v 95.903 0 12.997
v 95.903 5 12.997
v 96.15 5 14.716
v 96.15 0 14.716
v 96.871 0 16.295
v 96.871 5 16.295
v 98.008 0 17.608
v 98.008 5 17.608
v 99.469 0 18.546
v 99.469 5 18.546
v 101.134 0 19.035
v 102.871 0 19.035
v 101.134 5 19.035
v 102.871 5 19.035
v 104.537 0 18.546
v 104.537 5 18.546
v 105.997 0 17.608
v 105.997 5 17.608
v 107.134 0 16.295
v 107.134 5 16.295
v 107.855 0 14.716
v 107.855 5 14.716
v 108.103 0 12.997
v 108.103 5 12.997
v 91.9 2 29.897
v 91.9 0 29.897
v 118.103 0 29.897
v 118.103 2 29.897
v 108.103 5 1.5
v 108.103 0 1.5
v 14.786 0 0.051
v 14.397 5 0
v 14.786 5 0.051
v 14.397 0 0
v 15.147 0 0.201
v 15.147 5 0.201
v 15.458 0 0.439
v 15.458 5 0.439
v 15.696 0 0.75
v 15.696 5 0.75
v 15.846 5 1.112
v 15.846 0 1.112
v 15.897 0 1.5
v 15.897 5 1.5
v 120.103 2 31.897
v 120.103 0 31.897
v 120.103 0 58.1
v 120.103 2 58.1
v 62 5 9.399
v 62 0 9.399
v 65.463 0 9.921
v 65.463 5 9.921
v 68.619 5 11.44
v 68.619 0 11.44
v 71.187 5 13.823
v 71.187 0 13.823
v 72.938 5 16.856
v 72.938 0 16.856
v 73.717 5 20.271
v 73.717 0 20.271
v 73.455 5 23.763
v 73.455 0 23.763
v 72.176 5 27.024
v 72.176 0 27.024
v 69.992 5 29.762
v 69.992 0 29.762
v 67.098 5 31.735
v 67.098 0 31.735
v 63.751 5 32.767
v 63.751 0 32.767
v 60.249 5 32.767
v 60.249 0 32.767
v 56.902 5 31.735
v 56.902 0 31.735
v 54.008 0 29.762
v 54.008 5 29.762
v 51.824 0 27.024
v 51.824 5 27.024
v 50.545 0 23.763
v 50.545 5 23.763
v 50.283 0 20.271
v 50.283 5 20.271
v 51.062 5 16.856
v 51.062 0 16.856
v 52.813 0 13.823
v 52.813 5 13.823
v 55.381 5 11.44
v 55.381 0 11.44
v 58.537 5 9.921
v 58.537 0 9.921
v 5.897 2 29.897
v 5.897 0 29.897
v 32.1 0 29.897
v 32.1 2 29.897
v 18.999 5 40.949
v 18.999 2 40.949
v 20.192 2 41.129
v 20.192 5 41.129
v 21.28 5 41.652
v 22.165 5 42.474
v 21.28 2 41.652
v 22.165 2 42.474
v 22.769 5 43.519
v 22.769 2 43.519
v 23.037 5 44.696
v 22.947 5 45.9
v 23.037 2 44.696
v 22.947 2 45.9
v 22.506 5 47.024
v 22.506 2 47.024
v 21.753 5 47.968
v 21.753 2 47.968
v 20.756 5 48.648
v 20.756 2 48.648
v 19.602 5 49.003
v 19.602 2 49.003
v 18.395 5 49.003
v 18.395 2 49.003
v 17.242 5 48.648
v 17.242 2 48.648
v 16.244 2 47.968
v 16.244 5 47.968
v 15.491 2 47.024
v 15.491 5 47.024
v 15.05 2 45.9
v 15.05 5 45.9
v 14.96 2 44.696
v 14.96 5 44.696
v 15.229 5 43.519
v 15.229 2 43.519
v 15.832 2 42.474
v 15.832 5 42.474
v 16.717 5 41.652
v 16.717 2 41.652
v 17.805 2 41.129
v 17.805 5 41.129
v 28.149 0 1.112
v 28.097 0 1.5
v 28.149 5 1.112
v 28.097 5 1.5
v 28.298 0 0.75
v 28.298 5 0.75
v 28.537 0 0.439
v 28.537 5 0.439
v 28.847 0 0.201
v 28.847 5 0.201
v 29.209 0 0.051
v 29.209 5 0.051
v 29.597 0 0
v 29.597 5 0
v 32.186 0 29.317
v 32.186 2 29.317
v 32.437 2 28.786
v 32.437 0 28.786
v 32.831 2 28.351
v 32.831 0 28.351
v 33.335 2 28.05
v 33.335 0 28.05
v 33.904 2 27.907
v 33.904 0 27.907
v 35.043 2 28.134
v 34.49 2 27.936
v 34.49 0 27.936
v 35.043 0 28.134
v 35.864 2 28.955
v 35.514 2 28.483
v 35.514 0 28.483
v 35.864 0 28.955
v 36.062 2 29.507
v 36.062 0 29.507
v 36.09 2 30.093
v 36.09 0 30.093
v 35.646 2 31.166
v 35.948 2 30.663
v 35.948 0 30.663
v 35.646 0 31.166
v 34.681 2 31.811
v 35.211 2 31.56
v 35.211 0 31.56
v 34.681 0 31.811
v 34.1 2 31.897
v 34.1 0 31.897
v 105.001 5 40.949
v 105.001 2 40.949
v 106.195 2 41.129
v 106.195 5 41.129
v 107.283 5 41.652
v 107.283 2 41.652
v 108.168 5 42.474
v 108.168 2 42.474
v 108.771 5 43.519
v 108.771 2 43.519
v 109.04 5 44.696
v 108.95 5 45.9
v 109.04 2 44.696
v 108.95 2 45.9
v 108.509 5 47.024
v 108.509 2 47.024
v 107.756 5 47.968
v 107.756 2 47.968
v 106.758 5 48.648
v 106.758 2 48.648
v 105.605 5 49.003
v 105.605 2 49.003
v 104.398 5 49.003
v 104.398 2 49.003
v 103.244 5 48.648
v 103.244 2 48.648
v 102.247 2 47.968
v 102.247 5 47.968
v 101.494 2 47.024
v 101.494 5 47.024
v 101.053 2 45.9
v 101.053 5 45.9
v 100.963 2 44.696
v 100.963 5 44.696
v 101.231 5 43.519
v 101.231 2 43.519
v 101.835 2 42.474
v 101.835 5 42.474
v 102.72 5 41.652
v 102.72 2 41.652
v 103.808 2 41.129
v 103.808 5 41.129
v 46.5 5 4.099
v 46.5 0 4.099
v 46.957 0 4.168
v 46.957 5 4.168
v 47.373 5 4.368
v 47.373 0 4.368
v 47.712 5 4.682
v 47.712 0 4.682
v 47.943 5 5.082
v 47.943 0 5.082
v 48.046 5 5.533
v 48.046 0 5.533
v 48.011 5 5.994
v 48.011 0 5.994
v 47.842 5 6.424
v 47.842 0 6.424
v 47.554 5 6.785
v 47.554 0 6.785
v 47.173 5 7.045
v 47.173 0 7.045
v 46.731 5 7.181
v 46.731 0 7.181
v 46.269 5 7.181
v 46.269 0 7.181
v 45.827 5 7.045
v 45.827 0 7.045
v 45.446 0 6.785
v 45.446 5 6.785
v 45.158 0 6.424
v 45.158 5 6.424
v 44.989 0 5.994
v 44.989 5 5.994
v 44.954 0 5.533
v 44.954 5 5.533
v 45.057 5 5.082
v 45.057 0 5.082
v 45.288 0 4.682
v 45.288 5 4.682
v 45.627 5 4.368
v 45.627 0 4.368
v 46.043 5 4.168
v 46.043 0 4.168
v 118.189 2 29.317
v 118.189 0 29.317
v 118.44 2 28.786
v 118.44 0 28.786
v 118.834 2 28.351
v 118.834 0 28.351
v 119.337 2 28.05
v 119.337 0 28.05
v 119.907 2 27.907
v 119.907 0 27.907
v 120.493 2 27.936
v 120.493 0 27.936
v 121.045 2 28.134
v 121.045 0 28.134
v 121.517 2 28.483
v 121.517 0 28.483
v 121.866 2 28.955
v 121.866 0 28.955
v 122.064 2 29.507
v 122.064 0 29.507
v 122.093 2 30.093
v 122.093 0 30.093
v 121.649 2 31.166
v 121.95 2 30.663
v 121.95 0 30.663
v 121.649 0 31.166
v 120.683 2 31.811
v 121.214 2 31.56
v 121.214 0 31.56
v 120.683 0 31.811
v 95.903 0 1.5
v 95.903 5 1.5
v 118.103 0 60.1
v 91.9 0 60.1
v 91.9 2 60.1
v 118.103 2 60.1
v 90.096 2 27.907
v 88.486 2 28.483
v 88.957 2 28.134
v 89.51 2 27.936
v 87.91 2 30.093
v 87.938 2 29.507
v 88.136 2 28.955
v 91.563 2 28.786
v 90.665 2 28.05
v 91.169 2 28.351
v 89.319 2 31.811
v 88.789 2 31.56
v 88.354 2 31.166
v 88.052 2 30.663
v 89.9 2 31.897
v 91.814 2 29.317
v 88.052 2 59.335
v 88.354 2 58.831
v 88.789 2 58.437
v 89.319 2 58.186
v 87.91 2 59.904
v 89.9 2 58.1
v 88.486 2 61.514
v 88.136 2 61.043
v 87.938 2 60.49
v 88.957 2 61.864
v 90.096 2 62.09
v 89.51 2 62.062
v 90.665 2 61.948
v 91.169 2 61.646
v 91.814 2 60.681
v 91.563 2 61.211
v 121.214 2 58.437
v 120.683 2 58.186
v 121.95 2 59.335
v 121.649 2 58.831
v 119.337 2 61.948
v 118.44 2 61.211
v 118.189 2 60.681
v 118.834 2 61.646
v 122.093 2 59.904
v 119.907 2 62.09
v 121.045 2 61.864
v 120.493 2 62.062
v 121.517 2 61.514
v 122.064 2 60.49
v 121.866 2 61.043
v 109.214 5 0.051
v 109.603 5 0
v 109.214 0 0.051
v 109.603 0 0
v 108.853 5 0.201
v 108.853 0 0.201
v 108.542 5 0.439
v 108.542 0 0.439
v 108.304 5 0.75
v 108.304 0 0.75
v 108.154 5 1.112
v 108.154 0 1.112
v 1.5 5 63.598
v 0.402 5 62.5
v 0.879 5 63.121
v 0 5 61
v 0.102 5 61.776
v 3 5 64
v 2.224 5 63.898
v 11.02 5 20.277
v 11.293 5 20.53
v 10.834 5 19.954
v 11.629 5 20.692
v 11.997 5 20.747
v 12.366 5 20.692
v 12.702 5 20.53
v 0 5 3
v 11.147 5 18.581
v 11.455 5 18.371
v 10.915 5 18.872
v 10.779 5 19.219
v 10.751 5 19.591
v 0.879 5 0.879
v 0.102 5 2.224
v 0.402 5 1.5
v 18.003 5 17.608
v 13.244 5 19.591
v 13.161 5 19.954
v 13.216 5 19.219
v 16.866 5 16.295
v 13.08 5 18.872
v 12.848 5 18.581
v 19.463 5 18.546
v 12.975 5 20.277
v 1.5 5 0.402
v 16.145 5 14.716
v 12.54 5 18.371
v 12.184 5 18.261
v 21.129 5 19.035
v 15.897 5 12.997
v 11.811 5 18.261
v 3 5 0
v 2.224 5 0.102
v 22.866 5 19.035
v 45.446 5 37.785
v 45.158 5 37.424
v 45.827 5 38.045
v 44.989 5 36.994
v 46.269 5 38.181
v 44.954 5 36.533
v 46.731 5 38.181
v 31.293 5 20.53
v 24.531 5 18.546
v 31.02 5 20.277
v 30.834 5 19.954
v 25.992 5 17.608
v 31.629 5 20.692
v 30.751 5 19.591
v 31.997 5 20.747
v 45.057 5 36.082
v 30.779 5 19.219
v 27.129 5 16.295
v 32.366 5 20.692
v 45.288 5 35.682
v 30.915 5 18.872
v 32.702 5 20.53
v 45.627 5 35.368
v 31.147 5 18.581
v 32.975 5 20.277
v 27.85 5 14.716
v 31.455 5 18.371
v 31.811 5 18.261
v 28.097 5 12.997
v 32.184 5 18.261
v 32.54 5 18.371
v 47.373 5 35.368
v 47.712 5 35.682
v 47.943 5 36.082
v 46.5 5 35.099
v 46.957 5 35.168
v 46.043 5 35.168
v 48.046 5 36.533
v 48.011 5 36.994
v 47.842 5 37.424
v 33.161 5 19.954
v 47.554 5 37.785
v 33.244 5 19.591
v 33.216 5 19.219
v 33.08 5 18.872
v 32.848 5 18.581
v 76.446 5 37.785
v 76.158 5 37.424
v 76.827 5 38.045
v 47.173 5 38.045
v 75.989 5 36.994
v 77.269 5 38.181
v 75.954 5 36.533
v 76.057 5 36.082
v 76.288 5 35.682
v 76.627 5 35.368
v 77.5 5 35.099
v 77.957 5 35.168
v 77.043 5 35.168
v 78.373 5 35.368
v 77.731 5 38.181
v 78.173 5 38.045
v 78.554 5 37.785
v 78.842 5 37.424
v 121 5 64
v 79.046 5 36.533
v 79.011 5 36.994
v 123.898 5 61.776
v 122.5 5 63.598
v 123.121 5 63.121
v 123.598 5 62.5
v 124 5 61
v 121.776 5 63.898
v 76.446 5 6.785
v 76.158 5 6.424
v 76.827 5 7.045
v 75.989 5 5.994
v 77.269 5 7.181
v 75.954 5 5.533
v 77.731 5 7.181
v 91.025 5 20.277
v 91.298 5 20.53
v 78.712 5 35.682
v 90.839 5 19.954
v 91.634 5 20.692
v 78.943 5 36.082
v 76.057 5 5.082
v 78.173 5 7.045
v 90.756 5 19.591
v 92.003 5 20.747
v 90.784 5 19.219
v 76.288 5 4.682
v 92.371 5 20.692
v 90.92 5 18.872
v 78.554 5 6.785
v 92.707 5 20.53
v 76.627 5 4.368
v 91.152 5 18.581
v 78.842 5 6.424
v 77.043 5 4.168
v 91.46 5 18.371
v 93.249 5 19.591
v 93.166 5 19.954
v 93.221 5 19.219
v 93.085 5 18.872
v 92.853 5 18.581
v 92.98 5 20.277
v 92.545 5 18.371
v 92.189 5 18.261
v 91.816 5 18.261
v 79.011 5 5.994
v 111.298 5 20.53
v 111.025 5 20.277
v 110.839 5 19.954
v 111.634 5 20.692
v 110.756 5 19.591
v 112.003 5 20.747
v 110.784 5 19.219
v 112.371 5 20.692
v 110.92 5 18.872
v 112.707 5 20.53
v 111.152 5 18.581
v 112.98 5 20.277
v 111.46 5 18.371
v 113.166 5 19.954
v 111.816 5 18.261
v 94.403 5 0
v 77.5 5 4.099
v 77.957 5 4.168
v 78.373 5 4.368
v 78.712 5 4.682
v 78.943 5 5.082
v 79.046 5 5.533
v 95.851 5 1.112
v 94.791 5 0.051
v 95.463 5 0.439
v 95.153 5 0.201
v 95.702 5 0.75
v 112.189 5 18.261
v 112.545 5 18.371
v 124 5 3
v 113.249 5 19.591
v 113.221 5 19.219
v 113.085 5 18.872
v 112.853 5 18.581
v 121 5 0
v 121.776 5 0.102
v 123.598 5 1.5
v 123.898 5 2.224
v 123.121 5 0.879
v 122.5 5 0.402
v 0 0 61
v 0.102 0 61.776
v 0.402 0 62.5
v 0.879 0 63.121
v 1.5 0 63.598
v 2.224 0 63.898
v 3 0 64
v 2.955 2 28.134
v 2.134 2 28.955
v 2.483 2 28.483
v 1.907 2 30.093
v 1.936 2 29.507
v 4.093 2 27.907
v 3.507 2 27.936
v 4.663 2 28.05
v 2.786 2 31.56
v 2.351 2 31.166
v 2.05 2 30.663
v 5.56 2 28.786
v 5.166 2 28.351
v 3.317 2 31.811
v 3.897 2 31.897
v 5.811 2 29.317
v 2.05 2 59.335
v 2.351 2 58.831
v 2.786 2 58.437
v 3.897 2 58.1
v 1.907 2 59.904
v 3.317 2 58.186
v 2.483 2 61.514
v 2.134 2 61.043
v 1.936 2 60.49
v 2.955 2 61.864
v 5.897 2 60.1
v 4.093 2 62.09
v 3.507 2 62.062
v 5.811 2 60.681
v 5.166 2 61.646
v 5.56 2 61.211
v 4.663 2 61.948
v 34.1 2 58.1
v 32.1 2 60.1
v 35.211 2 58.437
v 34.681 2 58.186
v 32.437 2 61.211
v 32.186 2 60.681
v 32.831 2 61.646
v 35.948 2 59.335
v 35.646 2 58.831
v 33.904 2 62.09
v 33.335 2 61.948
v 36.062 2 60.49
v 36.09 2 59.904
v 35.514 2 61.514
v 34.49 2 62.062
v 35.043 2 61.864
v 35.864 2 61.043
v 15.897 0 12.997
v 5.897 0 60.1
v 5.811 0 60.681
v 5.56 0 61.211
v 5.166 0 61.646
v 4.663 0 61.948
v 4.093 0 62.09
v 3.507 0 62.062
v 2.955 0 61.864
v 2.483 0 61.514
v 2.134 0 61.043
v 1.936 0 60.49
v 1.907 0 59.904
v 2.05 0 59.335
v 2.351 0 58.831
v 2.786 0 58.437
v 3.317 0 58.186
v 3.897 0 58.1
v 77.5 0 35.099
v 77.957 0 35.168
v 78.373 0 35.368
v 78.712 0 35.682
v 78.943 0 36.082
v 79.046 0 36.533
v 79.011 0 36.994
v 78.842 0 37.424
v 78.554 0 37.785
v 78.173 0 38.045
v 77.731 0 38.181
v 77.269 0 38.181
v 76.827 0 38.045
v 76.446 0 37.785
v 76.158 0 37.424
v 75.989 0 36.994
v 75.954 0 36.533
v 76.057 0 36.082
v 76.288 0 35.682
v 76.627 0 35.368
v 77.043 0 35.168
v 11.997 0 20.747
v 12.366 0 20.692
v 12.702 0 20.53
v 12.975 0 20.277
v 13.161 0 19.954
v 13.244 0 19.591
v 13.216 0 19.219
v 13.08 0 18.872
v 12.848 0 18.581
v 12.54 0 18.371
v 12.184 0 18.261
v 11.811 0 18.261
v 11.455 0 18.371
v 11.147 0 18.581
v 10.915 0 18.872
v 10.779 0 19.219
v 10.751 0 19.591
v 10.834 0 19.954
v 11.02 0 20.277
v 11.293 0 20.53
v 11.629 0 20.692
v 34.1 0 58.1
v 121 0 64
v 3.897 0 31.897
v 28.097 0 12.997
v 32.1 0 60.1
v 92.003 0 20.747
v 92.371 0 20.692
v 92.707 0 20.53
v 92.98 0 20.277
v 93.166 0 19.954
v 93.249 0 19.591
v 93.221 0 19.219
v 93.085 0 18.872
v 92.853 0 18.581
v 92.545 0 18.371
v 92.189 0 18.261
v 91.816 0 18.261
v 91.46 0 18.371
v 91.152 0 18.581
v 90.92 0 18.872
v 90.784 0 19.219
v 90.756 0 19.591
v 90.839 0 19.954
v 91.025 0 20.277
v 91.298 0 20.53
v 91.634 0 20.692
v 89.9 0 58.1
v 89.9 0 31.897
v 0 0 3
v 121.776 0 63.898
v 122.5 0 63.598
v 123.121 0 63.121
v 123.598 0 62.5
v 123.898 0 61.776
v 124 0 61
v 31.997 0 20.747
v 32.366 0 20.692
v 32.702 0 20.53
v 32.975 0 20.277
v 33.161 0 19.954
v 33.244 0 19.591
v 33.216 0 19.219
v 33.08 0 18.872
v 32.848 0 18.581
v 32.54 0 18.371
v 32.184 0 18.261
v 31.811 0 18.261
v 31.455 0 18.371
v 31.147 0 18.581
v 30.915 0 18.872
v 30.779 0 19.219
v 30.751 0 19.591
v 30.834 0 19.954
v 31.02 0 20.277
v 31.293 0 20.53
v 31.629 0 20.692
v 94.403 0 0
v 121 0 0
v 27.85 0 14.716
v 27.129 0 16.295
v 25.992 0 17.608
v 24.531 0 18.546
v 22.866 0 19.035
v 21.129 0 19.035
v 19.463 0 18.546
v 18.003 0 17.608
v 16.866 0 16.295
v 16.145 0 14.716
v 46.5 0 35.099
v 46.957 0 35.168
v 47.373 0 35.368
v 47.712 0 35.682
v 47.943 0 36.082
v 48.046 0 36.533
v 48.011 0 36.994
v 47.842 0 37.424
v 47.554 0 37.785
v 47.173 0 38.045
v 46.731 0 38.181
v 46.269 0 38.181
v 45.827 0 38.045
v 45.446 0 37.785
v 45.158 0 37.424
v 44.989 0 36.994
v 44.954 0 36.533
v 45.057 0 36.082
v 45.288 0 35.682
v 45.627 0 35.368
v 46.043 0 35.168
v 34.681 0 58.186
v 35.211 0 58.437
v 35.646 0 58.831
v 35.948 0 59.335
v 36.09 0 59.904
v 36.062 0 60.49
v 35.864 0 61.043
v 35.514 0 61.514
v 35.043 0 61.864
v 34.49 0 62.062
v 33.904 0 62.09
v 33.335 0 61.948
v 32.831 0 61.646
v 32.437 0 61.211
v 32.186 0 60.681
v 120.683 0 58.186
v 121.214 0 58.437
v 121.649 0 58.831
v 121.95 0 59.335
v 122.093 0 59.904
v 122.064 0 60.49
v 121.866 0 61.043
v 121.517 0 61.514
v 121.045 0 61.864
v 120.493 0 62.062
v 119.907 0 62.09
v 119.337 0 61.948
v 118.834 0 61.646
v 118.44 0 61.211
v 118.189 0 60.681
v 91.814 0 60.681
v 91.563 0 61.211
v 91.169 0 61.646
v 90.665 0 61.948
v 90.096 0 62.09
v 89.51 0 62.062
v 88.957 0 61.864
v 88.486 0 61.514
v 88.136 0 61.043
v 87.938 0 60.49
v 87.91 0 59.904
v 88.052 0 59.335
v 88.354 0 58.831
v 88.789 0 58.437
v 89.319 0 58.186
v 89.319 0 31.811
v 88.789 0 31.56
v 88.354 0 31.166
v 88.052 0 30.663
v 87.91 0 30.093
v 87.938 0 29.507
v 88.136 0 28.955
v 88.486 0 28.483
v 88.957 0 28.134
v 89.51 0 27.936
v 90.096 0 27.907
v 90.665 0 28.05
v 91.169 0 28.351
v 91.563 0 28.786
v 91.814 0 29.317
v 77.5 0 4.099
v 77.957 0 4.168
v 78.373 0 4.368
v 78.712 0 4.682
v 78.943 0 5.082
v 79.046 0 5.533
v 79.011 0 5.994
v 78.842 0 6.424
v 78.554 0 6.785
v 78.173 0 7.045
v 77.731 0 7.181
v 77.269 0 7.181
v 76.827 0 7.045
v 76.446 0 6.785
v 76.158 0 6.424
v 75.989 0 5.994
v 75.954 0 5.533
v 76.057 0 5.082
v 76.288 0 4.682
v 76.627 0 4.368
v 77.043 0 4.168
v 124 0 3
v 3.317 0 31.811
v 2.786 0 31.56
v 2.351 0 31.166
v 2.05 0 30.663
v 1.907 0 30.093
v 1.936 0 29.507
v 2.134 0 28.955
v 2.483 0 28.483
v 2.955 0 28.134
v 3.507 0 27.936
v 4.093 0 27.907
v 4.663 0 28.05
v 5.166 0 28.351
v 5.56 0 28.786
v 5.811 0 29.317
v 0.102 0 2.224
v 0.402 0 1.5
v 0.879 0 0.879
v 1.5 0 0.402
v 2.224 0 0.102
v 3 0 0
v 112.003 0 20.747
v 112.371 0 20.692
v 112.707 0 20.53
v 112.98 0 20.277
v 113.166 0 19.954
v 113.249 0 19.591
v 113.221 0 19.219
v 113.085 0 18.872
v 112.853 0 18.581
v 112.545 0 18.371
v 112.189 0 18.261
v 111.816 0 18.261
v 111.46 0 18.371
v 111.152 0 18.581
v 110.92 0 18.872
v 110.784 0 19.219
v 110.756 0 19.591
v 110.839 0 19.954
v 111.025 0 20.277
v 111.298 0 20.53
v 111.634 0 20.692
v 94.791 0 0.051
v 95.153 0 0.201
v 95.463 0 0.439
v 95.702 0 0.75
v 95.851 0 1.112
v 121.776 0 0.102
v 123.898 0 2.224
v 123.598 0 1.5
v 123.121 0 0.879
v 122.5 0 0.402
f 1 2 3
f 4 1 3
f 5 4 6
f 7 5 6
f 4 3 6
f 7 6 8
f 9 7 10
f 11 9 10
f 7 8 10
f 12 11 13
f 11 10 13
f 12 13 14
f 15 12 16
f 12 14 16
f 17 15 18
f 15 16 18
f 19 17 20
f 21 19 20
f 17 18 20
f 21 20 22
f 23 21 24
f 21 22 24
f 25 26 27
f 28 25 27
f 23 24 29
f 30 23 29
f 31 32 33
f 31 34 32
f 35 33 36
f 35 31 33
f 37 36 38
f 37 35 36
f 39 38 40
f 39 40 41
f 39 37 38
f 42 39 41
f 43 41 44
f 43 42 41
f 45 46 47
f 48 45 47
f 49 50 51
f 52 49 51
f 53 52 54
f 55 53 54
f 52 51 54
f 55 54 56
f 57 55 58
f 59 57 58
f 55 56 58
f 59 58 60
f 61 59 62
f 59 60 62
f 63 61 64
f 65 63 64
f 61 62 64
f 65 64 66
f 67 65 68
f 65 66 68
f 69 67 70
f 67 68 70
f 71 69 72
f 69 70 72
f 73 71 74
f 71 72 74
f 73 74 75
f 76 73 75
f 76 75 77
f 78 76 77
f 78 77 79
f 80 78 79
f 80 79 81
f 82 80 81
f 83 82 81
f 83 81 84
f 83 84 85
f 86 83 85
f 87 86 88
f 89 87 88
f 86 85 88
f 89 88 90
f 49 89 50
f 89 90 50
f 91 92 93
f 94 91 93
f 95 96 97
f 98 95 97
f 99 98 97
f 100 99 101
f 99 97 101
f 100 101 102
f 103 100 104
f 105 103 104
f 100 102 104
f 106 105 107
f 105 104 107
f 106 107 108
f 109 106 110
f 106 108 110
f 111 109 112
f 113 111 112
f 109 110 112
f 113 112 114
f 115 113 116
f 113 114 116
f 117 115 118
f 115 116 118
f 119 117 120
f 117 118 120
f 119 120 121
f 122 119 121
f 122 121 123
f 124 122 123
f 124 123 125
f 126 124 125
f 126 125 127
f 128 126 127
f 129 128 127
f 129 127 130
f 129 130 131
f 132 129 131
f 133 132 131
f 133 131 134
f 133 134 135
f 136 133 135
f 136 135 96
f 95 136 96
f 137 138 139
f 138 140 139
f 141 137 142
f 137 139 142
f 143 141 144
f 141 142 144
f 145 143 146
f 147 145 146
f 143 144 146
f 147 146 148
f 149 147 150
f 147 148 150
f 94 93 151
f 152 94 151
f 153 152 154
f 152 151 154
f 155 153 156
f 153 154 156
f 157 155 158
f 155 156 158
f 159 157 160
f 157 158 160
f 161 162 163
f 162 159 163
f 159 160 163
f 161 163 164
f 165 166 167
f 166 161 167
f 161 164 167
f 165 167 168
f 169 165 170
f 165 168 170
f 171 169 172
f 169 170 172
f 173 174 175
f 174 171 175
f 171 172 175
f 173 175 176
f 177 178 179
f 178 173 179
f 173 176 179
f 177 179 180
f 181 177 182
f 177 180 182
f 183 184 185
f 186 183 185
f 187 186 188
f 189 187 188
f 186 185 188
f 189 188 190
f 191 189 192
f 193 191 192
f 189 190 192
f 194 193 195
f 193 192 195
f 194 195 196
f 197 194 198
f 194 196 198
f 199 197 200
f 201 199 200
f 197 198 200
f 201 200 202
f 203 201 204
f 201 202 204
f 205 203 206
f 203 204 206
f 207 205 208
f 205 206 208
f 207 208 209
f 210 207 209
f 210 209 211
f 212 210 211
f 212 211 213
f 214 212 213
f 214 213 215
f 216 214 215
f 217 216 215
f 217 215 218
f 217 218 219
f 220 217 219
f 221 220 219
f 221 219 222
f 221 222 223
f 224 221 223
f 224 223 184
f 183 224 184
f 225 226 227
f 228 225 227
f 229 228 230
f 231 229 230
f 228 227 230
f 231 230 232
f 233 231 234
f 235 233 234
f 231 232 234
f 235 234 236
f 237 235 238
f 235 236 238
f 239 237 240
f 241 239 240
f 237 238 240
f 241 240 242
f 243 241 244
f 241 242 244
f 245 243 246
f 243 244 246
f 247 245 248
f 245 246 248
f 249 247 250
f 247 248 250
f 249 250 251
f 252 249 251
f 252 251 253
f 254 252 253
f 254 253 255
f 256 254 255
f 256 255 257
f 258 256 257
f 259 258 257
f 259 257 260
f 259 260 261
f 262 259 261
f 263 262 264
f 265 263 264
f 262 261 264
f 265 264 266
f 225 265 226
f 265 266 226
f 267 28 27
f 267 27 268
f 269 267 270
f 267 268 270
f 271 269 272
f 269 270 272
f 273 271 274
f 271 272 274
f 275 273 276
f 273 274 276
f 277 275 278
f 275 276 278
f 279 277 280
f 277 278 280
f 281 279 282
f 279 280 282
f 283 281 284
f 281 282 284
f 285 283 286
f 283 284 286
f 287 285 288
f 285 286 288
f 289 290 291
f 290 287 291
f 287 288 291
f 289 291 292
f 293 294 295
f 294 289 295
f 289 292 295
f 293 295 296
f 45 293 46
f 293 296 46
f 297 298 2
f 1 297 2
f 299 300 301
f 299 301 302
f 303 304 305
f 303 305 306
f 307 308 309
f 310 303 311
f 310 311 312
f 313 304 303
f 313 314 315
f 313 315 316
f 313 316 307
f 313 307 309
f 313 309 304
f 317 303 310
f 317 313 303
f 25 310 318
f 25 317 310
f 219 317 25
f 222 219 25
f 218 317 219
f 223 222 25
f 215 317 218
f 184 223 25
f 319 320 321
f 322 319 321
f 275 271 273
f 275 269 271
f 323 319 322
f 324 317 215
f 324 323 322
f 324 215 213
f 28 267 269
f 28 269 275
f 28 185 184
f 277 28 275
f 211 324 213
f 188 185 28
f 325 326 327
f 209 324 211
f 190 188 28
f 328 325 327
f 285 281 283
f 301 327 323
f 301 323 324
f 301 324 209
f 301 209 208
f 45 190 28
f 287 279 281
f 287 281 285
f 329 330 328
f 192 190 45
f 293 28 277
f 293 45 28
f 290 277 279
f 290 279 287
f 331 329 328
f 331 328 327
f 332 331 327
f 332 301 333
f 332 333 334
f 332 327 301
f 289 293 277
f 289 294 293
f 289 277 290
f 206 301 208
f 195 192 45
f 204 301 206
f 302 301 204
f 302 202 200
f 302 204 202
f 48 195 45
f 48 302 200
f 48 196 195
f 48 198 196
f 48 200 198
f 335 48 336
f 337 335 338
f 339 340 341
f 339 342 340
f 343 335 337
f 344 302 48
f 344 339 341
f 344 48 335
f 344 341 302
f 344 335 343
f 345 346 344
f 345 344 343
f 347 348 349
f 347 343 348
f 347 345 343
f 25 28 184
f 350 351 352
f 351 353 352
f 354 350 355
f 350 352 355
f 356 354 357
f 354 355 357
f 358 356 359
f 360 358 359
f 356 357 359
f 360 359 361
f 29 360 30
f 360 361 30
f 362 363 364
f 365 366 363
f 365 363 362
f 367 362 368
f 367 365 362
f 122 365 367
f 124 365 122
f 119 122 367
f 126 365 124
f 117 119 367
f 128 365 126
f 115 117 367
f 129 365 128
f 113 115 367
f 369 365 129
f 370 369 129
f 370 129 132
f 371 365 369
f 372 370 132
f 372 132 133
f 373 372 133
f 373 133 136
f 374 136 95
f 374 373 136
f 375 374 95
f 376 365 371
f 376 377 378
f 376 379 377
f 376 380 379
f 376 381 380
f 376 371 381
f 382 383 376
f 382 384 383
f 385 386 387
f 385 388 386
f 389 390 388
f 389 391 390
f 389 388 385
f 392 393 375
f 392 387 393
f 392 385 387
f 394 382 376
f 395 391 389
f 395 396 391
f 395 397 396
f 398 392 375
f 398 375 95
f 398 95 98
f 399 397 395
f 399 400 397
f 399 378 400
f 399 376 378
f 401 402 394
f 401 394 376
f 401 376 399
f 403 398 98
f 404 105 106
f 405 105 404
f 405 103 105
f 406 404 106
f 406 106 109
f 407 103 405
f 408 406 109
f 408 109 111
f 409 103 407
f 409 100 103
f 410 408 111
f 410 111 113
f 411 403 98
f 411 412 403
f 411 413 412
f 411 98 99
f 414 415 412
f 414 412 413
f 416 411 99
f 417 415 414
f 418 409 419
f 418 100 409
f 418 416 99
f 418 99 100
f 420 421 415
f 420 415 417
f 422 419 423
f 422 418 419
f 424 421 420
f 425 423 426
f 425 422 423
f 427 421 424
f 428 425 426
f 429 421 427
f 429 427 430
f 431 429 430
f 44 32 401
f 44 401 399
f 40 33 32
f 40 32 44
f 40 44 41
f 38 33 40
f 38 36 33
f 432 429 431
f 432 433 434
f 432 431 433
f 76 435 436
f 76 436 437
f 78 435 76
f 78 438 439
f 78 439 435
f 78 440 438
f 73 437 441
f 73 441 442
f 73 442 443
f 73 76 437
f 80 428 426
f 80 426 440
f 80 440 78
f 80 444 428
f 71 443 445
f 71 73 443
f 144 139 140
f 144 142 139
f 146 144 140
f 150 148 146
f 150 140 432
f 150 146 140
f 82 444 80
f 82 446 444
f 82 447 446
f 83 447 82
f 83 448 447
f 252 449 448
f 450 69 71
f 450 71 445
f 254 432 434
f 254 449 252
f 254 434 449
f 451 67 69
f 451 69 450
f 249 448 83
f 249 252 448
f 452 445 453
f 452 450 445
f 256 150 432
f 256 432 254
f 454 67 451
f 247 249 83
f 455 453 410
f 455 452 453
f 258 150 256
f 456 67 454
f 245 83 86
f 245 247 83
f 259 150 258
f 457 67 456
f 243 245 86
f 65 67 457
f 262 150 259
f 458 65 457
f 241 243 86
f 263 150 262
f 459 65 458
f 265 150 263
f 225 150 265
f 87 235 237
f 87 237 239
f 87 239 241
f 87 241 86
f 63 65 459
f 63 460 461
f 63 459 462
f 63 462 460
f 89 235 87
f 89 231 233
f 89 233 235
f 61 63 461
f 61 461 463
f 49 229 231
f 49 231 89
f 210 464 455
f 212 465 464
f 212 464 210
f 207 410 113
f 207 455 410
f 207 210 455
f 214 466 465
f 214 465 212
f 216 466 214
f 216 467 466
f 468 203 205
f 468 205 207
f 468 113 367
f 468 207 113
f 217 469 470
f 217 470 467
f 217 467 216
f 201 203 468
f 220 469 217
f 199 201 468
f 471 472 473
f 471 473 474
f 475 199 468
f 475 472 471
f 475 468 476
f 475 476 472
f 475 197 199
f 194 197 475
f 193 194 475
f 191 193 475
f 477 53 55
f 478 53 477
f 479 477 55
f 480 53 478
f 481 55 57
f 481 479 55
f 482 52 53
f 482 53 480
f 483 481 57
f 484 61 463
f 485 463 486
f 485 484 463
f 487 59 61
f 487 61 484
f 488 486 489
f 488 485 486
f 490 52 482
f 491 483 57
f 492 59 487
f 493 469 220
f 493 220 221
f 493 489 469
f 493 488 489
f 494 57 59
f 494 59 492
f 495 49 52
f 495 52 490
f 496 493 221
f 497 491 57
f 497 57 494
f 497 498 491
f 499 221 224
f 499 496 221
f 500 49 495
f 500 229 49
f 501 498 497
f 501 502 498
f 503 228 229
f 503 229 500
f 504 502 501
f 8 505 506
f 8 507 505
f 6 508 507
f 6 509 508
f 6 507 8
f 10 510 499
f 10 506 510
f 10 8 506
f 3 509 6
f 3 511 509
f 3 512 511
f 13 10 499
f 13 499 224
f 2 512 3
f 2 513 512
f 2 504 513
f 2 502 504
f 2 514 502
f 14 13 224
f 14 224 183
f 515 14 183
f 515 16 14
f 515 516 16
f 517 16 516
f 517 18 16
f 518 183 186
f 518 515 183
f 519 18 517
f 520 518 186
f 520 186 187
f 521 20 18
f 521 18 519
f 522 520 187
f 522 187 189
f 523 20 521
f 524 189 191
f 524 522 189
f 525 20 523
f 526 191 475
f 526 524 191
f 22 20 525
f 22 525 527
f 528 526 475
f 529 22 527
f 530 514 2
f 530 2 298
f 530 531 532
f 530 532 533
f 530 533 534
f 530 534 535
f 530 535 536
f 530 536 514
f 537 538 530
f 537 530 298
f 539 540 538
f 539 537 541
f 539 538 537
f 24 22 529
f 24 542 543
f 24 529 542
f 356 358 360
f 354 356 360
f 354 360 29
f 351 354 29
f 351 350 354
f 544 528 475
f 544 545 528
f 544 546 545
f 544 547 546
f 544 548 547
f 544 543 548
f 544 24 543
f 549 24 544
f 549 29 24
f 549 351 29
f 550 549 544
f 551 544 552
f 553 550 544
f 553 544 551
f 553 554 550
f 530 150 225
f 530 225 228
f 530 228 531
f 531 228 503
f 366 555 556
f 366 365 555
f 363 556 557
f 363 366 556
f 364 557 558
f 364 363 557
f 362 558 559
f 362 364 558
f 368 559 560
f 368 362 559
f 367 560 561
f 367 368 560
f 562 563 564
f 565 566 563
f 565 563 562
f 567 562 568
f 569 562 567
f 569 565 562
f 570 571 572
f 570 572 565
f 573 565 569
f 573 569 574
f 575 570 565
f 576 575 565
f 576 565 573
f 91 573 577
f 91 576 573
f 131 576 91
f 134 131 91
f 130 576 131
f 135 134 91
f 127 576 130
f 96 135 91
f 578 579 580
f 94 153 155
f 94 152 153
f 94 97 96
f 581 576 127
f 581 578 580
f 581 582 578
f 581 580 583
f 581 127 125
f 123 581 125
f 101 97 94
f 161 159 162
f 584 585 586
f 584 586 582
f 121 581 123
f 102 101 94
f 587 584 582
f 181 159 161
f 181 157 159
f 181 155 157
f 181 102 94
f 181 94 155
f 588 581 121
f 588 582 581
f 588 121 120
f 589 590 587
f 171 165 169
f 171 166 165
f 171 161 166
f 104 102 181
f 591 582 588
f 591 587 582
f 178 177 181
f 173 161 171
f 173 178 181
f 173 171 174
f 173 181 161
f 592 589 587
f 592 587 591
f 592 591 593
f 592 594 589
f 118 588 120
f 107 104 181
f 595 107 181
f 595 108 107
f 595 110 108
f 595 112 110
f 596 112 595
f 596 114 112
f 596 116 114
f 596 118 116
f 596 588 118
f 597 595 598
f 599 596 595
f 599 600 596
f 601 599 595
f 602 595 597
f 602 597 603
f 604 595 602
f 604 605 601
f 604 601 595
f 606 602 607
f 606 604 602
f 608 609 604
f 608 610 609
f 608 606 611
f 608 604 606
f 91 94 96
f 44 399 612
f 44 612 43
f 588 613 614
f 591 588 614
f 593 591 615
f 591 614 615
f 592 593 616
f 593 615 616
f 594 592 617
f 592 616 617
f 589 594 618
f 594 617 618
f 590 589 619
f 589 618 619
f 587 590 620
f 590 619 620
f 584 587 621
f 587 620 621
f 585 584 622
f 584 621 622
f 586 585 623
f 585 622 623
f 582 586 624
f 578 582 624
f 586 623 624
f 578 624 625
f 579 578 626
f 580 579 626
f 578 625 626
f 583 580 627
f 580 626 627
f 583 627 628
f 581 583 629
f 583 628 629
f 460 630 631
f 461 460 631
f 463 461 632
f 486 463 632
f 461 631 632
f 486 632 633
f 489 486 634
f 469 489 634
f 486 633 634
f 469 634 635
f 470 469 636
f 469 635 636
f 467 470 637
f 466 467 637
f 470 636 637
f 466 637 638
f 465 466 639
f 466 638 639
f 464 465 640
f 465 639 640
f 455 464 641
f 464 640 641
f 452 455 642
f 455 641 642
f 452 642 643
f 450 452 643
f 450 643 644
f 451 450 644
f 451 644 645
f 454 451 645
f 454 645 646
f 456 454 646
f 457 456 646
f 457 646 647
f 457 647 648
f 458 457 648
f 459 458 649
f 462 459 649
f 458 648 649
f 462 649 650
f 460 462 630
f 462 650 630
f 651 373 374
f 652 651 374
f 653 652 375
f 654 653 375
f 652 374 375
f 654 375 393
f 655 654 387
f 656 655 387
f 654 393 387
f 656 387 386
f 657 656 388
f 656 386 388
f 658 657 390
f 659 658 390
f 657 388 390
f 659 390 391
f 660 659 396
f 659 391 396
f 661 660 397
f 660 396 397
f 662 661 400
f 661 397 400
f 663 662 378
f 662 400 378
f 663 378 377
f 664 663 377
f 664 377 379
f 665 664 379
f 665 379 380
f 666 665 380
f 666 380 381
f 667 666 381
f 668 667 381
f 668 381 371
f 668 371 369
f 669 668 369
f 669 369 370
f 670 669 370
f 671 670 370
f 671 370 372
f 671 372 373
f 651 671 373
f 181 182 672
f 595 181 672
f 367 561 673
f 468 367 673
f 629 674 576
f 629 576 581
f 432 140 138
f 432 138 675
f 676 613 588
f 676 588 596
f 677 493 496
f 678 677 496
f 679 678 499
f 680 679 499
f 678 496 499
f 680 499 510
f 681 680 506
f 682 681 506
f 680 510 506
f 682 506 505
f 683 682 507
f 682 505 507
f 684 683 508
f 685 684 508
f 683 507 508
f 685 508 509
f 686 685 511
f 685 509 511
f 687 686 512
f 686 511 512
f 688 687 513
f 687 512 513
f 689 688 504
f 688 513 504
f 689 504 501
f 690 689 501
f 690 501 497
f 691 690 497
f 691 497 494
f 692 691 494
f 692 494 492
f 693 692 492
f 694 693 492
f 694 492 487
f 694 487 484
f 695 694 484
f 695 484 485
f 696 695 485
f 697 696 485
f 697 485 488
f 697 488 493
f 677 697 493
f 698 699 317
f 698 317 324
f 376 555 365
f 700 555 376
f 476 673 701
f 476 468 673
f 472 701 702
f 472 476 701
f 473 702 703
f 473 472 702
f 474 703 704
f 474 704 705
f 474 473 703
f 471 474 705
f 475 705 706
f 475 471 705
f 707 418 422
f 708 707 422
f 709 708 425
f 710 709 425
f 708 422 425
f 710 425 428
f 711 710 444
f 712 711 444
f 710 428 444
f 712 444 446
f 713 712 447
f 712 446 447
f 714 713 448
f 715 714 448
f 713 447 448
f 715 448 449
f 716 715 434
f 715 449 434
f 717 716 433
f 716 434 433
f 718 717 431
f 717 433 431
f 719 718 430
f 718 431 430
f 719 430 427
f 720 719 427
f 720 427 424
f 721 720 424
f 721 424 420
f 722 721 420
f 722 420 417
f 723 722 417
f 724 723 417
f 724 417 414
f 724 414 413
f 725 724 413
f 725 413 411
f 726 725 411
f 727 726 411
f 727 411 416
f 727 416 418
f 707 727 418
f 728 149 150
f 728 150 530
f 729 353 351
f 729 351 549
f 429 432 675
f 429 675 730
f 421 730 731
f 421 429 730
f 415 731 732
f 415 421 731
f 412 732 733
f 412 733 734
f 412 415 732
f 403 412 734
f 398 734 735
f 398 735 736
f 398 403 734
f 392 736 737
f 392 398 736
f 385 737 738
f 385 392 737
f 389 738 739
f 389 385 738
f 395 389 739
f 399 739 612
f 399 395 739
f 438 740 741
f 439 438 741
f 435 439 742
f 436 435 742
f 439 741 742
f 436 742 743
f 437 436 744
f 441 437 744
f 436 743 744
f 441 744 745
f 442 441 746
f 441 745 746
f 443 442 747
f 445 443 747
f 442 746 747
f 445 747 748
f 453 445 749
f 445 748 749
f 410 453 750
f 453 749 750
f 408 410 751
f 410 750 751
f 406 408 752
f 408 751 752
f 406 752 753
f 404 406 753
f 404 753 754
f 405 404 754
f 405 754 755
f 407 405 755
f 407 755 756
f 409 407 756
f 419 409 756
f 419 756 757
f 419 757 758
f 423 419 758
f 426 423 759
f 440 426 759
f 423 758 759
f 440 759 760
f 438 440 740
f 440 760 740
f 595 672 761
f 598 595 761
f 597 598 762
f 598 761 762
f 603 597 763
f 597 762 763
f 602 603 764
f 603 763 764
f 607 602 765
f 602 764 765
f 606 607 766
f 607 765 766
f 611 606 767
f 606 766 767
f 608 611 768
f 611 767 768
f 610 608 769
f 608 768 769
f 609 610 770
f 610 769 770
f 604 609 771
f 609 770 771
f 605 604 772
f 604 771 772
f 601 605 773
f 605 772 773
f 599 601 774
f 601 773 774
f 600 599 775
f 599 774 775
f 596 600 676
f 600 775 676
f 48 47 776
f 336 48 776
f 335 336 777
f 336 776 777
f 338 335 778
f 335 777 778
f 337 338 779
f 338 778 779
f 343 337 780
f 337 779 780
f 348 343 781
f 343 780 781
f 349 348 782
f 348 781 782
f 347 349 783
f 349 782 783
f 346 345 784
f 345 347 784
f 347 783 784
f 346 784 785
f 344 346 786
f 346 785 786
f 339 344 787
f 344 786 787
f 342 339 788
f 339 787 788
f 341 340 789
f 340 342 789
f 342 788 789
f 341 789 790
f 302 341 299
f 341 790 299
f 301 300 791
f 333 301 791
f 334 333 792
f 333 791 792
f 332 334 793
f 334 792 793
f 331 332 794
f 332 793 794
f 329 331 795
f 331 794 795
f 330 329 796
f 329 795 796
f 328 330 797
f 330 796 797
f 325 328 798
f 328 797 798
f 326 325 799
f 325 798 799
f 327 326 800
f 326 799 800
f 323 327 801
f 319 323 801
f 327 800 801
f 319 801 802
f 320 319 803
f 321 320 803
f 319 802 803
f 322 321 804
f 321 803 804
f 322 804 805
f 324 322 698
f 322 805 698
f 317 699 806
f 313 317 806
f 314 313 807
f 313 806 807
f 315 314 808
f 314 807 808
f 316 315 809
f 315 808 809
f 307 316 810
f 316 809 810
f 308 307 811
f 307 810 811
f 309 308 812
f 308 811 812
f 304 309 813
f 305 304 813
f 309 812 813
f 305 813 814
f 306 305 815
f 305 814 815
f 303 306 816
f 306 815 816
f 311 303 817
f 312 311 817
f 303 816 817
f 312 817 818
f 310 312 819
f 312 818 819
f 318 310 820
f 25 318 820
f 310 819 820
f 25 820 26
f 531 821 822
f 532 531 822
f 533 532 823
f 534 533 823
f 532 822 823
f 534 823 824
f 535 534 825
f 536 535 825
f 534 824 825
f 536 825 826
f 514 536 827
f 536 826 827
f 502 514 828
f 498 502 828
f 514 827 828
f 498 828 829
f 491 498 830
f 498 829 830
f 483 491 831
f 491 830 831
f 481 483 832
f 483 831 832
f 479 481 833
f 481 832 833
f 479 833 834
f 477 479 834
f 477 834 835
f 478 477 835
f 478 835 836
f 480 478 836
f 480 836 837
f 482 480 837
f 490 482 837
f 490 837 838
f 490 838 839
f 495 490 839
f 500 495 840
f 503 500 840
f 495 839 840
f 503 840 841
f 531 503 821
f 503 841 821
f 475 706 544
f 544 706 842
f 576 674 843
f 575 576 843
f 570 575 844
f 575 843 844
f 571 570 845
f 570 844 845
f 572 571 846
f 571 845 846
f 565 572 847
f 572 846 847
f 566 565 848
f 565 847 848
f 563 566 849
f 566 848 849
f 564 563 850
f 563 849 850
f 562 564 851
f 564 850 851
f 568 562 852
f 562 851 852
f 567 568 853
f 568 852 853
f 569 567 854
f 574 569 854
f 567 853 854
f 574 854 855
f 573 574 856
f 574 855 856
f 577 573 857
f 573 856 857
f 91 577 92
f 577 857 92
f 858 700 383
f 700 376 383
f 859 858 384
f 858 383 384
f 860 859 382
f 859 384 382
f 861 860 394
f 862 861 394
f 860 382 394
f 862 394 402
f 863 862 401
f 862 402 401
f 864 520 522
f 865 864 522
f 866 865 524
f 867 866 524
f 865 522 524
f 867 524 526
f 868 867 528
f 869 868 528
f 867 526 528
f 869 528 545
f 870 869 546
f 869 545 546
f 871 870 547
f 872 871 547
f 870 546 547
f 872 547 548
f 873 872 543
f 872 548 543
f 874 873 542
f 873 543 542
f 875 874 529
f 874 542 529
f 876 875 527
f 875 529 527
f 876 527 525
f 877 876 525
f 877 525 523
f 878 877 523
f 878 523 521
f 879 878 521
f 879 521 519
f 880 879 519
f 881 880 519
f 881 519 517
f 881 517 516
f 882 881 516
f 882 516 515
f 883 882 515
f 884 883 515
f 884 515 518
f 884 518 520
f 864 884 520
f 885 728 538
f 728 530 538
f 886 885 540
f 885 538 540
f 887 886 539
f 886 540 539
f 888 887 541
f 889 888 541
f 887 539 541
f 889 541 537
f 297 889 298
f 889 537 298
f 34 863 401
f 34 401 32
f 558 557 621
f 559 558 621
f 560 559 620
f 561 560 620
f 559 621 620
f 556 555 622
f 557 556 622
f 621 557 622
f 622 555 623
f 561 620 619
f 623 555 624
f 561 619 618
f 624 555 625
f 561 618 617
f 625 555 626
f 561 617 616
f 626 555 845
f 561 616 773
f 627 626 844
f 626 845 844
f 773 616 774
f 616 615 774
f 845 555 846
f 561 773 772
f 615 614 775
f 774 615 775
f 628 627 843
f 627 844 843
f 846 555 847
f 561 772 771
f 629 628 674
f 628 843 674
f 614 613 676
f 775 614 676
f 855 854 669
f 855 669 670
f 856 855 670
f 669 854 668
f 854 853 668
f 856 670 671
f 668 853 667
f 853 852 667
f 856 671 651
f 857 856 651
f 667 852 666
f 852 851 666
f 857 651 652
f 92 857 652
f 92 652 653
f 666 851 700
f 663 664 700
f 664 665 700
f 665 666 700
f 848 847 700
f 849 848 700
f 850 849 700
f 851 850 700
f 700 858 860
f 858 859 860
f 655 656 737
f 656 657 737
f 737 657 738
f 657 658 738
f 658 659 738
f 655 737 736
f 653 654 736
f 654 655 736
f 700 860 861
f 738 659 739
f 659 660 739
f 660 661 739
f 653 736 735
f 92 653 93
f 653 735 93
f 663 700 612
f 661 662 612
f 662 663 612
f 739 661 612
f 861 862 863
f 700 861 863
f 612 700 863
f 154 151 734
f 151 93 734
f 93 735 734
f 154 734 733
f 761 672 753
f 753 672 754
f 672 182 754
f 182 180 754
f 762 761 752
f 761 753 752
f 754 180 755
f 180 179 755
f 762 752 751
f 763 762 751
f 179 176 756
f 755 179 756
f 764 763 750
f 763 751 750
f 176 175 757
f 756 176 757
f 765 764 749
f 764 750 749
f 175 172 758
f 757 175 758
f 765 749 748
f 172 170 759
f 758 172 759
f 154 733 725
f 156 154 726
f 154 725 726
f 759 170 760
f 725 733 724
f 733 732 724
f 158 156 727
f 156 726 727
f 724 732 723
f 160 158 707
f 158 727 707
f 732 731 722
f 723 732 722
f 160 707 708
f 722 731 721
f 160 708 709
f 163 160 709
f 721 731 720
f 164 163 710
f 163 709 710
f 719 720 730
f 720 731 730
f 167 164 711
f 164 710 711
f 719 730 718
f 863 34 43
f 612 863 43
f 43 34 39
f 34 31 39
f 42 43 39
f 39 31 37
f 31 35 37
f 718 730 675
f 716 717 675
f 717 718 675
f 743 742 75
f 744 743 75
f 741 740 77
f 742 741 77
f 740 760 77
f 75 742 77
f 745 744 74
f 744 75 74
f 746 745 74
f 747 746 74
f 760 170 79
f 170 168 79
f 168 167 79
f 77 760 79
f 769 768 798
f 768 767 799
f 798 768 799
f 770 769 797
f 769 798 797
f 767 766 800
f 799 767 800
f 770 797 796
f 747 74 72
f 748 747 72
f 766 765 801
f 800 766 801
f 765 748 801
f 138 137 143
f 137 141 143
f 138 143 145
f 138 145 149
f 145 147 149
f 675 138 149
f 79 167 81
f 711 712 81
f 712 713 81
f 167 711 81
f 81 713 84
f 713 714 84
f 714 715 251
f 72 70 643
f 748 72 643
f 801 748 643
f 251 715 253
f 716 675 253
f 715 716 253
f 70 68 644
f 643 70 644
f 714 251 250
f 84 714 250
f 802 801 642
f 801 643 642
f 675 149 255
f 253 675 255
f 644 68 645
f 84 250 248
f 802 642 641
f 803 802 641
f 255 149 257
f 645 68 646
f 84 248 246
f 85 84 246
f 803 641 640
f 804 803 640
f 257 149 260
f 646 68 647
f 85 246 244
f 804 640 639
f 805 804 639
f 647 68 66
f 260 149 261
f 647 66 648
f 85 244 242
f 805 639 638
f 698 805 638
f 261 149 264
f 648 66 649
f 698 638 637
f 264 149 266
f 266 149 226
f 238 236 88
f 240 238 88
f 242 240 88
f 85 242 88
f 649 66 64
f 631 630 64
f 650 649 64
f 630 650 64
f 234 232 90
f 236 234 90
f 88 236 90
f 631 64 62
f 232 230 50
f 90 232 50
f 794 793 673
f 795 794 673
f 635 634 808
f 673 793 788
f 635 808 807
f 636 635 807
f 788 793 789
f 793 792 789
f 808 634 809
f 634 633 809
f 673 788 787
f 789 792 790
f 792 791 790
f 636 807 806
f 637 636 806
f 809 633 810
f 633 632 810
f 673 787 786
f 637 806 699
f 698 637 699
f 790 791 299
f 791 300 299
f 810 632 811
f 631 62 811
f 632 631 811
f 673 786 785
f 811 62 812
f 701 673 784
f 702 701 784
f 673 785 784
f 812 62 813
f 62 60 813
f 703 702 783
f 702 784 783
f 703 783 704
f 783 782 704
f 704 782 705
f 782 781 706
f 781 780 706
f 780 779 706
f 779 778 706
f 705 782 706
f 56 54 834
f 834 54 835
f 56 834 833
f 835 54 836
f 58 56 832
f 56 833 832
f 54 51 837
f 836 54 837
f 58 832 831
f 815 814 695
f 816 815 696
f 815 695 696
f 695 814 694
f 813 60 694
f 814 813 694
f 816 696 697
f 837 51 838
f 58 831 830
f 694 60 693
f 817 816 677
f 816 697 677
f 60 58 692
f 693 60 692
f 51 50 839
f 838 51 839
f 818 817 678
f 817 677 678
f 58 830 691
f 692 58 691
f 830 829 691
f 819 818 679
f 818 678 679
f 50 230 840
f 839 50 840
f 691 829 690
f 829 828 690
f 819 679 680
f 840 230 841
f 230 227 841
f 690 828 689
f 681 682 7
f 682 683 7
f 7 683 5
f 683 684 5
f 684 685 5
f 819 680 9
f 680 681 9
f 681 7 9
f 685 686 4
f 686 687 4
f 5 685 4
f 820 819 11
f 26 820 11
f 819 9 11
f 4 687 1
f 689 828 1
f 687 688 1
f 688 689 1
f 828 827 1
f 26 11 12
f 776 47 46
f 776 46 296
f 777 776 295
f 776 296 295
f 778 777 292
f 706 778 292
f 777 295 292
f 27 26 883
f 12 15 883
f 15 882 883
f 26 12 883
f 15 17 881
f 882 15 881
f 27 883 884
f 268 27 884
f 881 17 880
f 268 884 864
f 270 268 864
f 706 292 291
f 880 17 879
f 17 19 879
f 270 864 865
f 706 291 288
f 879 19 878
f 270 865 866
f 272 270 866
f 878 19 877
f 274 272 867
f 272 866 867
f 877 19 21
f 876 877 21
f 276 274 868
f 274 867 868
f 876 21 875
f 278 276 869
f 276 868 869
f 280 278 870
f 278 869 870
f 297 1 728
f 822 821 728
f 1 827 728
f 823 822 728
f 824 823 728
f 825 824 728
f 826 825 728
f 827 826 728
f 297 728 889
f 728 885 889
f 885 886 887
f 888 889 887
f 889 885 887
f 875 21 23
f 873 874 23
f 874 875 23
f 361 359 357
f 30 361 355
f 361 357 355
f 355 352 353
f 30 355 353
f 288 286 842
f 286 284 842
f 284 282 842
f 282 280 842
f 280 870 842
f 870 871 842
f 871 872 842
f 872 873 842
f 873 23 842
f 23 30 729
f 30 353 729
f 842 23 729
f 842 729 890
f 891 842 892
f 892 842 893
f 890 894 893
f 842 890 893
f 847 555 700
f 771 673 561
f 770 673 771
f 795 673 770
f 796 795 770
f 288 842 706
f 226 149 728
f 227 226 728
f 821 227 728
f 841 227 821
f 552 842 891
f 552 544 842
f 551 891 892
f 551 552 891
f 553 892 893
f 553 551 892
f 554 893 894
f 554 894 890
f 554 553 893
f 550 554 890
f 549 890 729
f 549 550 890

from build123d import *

# Parameters (mm, degrees)
SKETCH1_W           = 124
SKETCH1_H           = 64
BOSS_EXTRUDE1_DEPTH = 5
CUT_EXTRUDE1_DEPTH  = 5
SKETCH3_W           = 30.202540726
SKETCH3_H           = 30.202540726
CUT_EXTRUDE2_DEPTH  = 2
SKETCH4_R           = 2
CUT_EXTRUDE3_DEPTH  = 2
SKETCH5_R           = 4.05
SKETCH5_R_2         = 1.55
SKETCH5_R_3         = 11.75
CUT_EXTRUDE4_DEPTH  = 5
SKETCH6_R           = 1.25
CUT_EXTRUDE5_DEPTH  = 10
FILLET1_R           = 3
FILLET2_R           = 1.5


with BuildPart() as part:
    # Sketch1 → Boss-Extrude1 (new body)
    with BuildSketch(Plane(origin=(0, 0, 0), x_dir=(1, 0, 0), z_dir=(0, 1, 0))):
        with Locations((62, -32)):
            Rectangle(SKETCH1_W, SKETCH1_H)
    extrude(amount=BOSS_EXTRUDE1_DEPTH)

    # Sketch2 → Cut-Extrude1 (cut)
    with BuildSketch(Plane(origin=(0, 5, 0), x_dir=(1, 0, 0), z_dir=(0, 1, 0))):
        with BuildLine():
            Line((15.897459274, -12.997459274), (15.897459274, 12.365379101))
            Line((15.897459274, 12.365379101), (28.097459274, 12.365379101))
            Line((28.097459274, 12.365379101), (28.097459274, -12.997459274))
            ThreePointArc((28.097459274, -12.997459274), (21.997459274, -19.097459274), (15.897459274, -12.997459274))
        make_face()
        with BuildLine():
            Line((95.902540726, 12.365379101), (95.902540726, -12.997459274))
            ThreePointArc((95.902540726, -12.997459274), (102.002540726, -19.097459274), (108.102540726, -12.997459274))
            Line((108.102540726, -12.997459274), (108.102540726, 12.365379101))
            Line((108.102540726, 12.365379101), (95.902540726, 12.365379101))
        make_face()
    extrude(amount=-CUT_EXTRUDE1_DEPTH, mode=Mode.SUBTRACT)

    # Sketch3 → Cut-Extrude2 (cut)
    with BuildSketch(Plane.XZ):
        with Locations((18.998729637, 44.998729637)):
            Rectangle(SKETCH3_W, SKETCH3_H)
        with Locations((105.001270363, 44.998729637)):
            Rectangle(SKETCH3_W, SKETCH3_H)
    extrude(amount=-CUT_EXTRUDE2_DEPTH, mode=Mode.SUBTRACT)

    # Sketch4 → Cut-Extrude3 (cut)
    with BuildSketch(Plane.XZ):
        with Locations((34.1, 29.897459274)):
            Circle(SKETCH4_R)
        with Locations((34.1, 60.1)):
            Circle(SKETCH4_R)
        with Locations((3.897459274, 60.1)):
            Circle(SKETCH4_R)
        with Locations((3.897459274, 29.897459274)):
            Circle(SKETCH4_R)
        with Locations((120.102540726, 29.897459274)):
            Circle(SKETCH4_R)
        with Locations((120.102540726, 60.1)):
            Circle(SKETCH4_R)
        with Locations((89.9, 60.1)):
            Circle(SKETCH4_R)
        with Locations((89.9, 29.897459274)):
            Circle(SKETCH4_R)
    extrude(amount=-CUT_EXTRUDE3_DEPTH, mode=Mode.SUBTRACT)

    # Sketch5 → Cut-Extrude4 (cut)
    with BuildSketch(Plane.XZ):
        with Locations(Location((18.998729637, 44.998729637, 0), (0, 0, 270))):
            Circle(SKETCH5_R)
        with Locations(Location((105.001270363, 44.998729637, 0), (0, 0, 270))):
            Circle(SKETCH5_R)
        with Locations(Location((77.5, 36.648702719, 0), (0, 0, 270))):
            Circle(SKETCH5_R_2)
        with Locations(Location((46.5, 36.648702719, 0), (0, 0, 270))):
            Circle(SKETCH5_R_2)
        with Locations(Location((46.5, 5.648702719, 0), (0, 0, 270))):
            Circle(SKETCH5_R_2)
        with Locations(Location((77.5, 5.648702719, 0), (0, 0, 270))):
            Circle(SKETCH5_R_2)
        with Locations(Location((62, 21.148702719, 0), (0, 0, 270))):
            Circle(SKETCH5_R_3)
    extrude(amount=-CUT_EXTRUDE4_DEPTH, mode=Mode.SUBTRACT)

    # Sketch6 → Cut-Extrude5 (cut)
    with BuildSketch(Plane(origin=(0, 5, 0), x_dir=(1, 0, 0), z_dir=(0, 1, 0))):
        with Locations(Location((11.997459274, -19.497459274, 0), (0, 0, 270))):
            Circle(SKETCH6_R)
        with Locations(Location((31.997459274, -19.497459274, 0), (0, 0, 270))):
            Circle(SKETCH6_R)
        with Locations(Location((92.002540726, -19.497459274, 0), (0, 0, 270))):
            Circle(SKETCH6_R)
        with Locations(Location((112.002540726, -19.497459274, 0), (0, 0, 270))):
            Circle(SKETCH6_R)
    extrude(amount=-CUT_EXTRUDE5_DEPTH, mode=Mode.SUBTRACT)

    # Fillet1
    fillet1_edges = [part.edges().sort_by_distance(p)[0] for p in [
        (0, 2.5, 0),
        (124, 2.5, 0),
        (124, 2.5, 64),
        (0, 2.5, 64),
    ]]
    fillet(fillet1_edges, radius=FILLET1_R)

    # Fillet2
    fillet2_edges = [part.edges().sort_by_distance(p)[0] for p in [
        (15.897459274, 2.5, 0),
        (28.097459274, 2.5, 0),
        (95.902540726, 2.5, 0),
        (108.102540726, 2.5, 0),
    ]]
    fillet(fillet2_edges, radius=FILLET2_R)


solid = part.part
